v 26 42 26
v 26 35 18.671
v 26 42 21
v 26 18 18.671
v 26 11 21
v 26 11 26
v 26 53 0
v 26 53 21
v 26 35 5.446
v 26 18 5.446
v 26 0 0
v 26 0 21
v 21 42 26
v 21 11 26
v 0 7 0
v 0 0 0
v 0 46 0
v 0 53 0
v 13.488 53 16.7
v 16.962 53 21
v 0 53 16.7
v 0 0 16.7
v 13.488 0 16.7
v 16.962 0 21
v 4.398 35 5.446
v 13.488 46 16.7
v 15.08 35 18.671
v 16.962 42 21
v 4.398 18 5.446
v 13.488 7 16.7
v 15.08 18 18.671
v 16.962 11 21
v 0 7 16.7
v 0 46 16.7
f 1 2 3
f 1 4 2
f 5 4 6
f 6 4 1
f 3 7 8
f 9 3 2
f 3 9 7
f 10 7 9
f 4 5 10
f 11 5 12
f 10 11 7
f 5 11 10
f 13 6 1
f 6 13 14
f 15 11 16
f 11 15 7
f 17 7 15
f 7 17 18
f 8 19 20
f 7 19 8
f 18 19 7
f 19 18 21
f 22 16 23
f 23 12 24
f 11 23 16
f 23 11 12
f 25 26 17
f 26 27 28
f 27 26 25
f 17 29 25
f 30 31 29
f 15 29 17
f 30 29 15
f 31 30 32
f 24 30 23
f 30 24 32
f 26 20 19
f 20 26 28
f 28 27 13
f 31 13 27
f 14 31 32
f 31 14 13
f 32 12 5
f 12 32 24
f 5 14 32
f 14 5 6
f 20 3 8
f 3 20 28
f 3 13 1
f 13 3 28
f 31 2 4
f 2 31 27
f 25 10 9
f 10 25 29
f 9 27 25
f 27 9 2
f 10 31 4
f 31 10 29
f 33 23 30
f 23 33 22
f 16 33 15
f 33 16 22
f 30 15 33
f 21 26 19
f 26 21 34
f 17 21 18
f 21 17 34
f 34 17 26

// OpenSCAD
a = atan((21+5)/(26-5));
h1=17*sin(a);
h2=7*sin(a);

union() {
    difference() {
        cube([26, 39+7+7, 21+5]);

        rotate([0,90-a, 0])
        translate([-30,-1,0])
        cube([30, 39+7+7+2, 50]);
        
        translate([-1, -1, 21])
        cube([28, 12, 6]);

        translate([-1, 31+11, 21])
        cube([28, 12, 6]);
        
        translate([0,7+11, h2])
        cube([27, 17, h1]);
        
    }
    cube([26, 7, 16.7]);
    translate([0,39+7,0])
    cube([26, 7, 16.7]);
}
